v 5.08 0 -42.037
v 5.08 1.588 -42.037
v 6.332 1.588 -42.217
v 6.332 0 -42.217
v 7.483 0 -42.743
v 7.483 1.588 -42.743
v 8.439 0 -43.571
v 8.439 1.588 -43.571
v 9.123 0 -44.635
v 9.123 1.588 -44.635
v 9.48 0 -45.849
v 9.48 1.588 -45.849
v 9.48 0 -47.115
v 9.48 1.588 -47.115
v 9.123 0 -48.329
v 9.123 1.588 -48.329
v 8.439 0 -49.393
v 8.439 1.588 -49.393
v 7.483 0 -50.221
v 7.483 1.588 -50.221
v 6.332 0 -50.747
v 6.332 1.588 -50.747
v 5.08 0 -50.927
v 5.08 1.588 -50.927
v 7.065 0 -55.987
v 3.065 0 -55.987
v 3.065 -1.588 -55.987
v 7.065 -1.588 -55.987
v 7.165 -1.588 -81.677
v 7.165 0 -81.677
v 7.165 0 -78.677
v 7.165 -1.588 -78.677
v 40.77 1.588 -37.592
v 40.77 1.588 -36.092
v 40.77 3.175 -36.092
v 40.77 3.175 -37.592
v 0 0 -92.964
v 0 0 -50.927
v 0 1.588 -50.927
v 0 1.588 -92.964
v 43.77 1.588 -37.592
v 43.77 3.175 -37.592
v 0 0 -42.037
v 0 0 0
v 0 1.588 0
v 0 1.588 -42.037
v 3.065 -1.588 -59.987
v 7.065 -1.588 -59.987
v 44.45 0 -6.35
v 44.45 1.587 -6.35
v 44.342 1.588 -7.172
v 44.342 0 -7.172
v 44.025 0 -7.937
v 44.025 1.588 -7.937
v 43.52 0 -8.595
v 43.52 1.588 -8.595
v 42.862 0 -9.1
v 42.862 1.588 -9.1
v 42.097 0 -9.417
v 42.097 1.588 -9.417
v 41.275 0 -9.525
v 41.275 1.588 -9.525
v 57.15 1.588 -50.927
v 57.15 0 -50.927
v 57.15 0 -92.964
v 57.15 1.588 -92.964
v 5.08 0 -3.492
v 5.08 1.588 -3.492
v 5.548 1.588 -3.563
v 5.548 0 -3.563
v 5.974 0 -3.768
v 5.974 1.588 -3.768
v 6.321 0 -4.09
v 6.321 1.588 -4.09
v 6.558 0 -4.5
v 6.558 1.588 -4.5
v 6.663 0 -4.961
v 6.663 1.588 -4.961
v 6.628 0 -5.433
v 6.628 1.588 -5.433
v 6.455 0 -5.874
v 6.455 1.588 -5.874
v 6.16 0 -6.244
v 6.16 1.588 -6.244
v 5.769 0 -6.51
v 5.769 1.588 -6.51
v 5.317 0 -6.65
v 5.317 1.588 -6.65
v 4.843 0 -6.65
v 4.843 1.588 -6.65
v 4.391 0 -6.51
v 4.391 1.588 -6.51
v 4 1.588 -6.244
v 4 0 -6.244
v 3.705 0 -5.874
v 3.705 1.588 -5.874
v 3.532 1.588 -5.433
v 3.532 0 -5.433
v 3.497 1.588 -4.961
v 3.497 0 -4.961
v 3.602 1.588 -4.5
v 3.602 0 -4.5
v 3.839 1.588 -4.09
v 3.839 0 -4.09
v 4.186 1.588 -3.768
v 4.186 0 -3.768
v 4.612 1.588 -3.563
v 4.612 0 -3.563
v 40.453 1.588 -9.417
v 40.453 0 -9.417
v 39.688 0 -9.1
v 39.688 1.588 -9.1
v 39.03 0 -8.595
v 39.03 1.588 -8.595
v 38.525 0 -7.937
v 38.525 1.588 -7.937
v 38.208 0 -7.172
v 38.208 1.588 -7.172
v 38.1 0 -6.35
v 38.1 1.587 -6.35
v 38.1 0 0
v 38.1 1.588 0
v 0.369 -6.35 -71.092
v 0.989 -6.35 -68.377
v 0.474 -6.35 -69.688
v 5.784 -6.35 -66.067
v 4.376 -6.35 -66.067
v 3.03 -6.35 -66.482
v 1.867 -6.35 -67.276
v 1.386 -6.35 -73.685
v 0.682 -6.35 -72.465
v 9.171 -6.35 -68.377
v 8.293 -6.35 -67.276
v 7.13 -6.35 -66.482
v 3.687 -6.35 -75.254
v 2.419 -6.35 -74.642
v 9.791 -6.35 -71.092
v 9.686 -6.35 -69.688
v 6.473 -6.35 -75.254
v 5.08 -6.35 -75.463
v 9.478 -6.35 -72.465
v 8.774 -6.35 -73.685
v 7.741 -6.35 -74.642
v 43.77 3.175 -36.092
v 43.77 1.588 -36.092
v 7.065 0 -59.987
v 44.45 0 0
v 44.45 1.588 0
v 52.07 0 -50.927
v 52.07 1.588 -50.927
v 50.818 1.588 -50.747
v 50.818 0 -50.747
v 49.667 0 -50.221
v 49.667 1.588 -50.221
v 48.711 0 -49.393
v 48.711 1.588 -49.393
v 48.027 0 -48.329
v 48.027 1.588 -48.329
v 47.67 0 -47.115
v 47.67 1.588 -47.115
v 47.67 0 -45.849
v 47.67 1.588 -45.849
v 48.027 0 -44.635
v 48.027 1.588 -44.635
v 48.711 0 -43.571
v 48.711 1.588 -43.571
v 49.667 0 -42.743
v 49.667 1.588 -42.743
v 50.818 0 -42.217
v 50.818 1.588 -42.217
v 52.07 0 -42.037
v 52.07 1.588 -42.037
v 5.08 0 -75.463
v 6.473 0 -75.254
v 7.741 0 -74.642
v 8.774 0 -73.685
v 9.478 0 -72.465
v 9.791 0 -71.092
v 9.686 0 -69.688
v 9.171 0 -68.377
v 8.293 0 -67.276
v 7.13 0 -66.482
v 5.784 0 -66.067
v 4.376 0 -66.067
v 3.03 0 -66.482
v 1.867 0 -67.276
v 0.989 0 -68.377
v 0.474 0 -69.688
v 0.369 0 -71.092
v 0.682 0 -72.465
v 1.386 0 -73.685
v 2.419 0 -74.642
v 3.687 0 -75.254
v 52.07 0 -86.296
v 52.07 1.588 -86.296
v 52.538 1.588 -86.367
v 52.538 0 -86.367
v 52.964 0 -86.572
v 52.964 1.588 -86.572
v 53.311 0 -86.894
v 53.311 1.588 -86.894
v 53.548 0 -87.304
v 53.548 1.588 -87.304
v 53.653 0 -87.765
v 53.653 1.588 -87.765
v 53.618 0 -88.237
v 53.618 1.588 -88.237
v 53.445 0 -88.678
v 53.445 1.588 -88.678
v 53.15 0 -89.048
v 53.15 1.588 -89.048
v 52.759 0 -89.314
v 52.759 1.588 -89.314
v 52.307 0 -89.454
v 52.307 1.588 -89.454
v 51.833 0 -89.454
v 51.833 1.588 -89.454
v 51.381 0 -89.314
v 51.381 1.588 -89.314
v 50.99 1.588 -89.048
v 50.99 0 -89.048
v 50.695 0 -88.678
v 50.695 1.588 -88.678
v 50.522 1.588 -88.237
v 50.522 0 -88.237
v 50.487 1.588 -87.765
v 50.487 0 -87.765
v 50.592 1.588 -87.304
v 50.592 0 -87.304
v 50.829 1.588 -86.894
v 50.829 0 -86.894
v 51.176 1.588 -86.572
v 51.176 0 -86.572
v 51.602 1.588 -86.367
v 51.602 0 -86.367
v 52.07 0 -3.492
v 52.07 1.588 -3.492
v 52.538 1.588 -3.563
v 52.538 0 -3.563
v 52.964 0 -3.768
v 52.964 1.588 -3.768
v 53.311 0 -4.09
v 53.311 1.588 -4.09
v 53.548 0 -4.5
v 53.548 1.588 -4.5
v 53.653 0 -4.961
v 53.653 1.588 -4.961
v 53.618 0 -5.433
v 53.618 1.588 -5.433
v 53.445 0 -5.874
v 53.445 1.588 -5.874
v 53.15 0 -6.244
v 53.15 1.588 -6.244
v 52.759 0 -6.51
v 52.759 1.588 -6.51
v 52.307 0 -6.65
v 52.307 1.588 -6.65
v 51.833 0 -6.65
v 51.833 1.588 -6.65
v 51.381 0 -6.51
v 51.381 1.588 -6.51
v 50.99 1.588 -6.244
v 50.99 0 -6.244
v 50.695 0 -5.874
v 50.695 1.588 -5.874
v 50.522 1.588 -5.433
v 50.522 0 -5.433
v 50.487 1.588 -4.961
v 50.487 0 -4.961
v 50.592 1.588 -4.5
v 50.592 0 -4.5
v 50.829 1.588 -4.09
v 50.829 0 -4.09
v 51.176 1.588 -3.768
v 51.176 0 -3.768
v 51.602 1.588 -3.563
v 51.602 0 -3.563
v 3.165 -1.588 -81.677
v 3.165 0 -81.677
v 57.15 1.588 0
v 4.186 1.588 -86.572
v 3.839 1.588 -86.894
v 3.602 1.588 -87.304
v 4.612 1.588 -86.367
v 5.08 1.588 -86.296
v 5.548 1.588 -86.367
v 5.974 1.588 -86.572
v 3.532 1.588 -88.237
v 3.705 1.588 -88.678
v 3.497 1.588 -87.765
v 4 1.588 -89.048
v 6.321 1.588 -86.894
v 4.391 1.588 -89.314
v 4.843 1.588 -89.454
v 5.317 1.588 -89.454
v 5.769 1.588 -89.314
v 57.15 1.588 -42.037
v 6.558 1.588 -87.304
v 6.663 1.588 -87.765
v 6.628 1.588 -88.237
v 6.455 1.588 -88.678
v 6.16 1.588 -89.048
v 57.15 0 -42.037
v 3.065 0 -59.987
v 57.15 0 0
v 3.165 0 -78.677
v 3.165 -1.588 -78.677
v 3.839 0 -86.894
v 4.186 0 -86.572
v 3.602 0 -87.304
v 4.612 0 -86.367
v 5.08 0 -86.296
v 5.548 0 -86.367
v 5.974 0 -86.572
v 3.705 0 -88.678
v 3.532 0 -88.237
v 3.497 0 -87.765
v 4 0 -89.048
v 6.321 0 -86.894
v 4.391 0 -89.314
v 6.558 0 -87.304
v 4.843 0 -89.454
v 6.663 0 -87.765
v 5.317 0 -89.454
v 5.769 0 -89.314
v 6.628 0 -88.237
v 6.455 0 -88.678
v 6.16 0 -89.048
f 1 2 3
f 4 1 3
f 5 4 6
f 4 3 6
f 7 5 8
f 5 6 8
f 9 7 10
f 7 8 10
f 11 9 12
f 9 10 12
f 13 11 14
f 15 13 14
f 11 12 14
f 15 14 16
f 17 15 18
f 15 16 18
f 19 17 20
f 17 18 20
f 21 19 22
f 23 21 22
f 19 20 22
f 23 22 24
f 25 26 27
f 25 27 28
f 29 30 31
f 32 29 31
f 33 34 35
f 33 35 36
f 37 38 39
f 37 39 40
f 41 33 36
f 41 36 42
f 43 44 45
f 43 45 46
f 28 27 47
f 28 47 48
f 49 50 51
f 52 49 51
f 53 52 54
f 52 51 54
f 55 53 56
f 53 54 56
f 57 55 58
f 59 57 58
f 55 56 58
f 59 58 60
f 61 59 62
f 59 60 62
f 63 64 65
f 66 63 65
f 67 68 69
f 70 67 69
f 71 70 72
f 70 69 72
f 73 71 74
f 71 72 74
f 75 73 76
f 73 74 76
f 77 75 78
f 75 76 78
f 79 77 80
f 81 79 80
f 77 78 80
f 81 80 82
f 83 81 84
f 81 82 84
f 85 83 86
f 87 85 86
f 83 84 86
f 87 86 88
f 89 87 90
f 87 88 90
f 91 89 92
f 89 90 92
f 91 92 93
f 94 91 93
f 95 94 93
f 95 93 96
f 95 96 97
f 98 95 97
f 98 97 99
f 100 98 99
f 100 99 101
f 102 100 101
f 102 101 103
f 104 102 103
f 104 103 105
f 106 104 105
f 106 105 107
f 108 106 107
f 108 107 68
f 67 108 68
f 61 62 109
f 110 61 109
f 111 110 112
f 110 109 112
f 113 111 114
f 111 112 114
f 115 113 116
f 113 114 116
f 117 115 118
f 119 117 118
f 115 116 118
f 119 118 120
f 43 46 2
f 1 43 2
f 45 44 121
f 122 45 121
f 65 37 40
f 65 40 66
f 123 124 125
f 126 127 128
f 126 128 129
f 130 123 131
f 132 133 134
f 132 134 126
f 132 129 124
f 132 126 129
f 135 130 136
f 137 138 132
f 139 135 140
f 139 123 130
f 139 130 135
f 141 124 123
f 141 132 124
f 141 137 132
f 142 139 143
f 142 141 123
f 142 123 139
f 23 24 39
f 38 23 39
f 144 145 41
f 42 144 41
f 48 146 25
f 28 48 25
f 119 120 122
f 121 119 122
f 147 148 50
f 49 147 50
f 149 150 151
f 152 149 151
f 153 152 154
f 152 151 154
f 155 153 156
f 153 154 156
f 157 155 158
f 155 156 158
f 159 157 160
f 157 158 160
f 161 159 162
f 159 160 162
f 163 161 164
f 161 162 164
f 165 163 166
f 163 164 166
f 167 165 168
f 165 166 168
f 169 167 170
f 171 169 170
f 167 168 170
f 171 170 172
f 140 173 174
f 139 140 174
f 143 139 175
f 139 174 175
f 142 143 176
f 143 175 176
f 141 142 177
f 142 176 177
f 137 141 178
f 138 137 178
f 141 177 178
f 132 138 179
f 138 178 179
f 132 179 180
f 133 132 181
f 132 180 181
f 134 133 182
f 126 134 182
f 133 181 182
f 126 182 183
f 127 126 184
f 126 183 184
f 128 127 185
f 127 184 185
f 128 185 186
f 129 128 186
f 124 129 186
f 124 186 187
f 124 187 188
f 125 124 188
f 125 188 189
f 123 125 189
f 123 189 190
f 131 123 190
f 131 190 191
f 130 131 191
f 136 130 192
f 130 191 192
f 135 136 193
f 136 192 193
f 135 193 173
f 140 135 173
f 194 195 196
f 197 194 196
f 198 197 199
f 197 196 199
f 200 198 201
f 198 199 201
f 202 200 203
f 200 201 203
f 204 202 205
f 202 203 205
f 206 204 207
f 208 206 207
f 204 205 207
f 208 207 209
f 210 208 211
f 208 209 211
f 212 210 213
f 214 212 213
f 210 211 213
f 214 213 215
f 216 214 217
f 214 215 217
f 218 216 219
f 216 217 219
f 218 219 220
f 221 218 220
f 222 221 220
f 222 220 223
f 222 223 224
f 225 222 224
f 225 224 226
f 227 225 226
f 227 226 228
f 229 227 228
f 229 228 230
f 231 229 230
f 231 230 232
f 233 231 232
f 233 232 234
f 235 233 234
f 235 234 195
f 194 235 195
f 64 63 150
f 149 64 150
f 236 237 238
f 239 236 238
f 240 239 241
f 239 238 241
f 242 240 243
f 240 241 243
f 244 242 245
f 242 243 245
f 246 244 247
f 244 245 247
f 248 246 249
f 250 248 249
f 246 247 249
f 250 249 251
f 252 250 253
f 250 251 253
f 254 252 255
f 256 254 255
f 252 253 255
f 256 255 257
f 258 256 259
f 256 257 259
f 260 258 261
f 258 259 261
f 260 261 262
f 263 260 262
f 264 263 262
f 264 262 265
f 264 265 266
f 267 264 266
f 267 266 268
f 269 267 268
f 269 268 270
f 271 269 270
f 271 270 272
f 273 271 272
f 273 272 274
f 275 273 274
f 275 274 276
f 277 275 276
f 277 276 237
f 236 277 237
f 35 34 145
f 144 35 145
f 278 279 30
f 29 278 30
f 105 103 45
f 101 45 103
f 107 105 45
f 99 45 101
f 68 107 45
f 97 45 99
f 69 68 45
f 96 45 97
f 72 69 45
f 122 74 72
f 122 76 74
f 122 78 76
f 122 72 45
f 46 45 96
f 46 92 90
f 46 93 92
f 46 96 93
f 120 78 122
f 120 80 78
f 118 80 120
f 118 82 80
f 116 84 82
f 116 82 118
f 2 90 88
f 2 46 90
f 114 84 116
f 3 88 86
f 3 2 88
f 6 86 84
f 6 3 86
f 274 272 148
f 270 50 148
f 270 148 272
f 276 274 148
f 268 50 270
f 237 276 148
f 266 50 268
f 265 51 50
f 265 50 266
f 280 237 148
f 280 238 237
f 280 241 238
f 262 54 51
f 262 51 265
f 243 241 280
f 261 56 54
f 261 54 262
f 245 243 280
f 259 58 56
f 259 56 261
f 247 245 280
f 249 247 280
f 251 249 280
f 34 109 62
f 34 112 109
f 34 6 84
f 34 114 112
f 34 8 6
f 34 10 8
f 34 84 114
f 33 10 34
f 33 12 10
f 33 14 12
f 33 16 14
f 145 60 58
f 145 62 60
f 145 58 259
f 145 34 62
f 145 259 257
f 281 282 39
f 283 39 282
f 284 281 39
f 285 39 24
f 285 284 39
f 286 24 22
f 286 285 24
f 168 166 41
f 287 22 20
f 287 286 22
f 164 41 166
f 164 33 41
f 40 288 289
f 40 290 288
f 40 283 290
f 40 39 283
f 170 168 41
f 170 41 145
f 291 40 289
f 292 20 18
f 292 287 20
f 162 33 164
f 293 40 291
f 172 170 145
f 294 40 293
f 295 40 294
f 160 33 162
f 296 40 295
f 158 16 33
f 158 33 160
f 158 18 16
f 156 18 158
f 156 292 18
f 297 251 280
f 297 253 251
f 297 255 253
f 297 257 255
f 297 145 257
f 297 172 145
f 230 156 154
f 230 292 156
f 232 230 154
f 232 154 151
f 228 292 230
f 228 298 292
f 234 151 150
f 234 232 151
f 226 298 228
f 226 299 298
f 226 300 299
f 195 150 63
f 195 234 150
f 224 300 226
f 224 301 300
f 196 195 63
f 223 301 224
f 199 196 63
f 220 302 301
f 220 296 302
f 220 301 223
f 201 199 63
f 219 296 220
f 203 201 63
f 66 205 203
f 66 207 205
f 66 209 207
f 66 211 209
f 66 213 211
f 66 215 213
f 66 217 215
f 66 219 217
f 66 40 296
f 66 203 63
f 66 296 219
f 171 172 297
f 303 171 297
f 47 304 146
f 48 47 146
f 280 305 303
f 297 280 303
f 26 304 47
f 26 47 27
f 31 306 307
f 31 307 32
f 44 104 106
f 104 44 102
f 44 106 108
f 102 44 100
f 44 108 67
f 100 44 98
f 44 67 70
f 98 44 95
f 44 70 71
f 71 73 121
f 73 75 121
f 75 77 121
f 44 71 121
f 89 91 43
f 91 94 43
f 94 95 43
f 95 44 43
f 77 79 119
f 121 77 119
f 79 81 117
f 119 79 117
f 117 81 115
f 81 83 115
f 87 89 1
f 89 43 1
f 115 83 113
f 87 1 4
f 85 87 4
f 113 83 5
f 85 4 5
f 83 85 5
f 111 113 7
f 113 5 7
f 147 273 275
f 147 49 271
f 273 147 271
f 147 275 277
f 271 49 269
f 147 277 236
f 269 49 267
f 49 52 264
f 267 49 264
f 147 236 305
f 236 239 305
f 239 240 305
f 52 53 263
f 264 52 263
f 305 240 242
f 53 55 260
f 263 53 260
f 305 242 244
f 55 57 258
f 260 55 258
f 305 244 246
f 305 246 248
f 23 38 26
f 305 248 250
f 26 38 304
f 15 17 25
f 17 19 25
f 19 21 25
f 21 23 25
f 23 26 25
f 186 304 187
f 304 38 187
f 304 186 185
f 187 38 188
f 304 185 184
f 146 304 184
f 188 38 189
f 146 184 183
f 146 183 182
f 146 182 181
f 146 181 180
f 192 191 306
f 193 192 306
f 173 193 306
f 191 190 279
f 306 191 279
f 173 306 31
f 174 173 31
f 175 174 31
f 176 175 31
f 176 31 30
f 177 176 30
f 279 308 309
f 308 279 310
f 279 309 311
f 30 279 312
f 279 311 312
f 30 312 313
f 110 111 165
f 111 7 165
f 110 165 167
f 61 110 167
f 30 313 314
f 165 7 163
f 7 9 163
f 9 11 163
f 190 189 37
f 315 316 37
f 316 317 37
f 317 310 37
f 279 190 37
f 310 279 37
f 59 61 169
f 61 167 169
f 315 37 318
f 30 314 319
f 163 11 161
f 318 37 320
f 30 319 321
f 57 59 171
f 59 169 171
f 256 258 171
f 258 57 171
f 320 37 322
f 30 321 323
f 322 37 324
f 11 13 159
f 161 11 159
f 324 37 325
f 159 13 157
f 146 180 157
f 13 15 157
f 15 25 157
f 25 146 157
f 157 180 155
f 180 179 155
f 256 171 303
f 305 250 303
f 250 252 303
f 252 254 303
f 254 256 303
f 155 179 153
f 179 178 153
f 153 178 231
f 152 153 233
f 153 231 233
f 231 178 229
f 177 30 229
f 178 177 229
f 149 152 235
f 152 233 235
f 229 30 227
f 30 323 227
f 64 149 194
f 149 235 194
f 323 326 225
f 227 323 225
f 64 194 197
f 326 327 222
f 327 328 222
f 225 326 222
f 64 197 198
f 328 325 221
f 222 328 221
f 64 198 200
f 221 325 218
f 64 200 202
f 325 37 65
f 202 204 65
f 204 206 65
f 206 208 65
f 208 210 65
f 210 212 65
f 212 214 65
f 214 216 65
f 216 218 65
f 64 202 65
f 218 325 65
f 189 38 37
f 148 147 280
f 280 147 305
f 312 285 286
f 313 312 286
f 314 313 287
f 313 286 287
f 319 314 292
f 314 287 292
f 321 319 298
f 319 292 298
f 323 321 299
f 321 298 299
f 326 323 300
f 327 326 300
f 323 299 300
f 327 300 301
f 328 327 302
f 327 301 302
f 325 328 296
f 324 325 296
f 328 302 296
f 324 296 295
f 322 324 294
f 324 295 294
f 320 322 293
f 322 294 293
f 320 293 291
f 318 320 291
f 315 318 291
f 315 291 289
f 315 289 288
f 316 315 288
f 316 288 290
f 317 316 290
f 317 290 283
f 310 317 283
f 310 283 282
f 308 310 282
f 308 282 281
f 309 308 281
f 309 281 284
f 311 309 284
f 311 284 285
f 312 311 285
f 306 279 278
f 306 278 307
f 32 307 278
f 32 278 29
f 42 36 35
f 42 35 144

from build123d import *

# Parameters (mm, degrees)
SKETCH1_W           = 57.15
SKETCH1_H           = 92.964
BOSS_EXTRUDE1_DEPTH = 1.5875
SKETCH2_R           = 1.5875
CUT_EXTRUDE1_DEPTH  = 110.137289467
SKETCH3_R           = 4.445
CUT_EXTRUDE2_DEPTH  = 110.137289467
CUT_EXTRUDE3_REACH  = 111.137
SKETCH5_R           = 4.7244
BOSS_EXTRUDE2_DEPTH = 6.35
SKETCH5_3_W         = 4
SKETCH5_3_H         = 4
SKETCH5_3_H_2       = 3
BOSS_EXTRUDE3_DEPTH = 1.5875
SKETCH7_W           = 3
SKETCH7_H           = 1.5
BOSS_EXTRUDE4_DEPTH = 1.5875


with BuildPart() as part:
    # Sketch1 → Boss-Extrude1 (new body)
    with BuildSketch(Plane(origin=(0, 0, 0), x_dir=(1, 0, 0), z_dir=(0, 1, 0))):
        with Locations((28.575, 46.482)):
            Rectangle(SKETCH1_W, SKETCH1_H)
    extrude(amount=BOSS_EXTRUDE1_DEPTH)

    # Sketch2 → Cut-Extrude1 (cut, through all)
    with BuildSketch(Plane(origin=(0, 1.5875, 0), x_dir=(1, 0, 0), z_dir=(0, 1, 0))):
        with Locations(Location((5.08, 87.884, 0), (0, 0, 270))):
            Circle(SKETCH2_R)
        with Locations(Location((52.07, 87.884, 0), (0, 0, 270))):
            Circle(SKETCH2_R)
        with Locations(Location((5.08, 5.08, 0), (0, 0, 270))):
            Circle(SKETCH2_R)
        with Locations(Location((52.07, 5.08, 0), (0, 0, 270))):
            Circle(SKETCH2_R)
    extrude(amount=-CUT_EXTRUDE1_DEPTH, mode=Mode.SUBTRACT)

    # Sketch3 → Cut-Extrude2 (cut, through all)
    with BuildSketch(Plane(origin=(0, 1.5875, 0), x_dir=(1, 0, 0), z_dir=(0, 1, 0))):
        with BuildLine():
            ThreePointArc((56.515, 46.482), (55.213089642, 43.338910358), (52.07, 42.037))
            Line((52.07, 42.037), (57.15, 42.037))
            Line((57.15, 42.037), (57.15, 50.927))
            Line((57.15, 50.927), (52.07, 50.927))
            ThreePointArc((52.07, 50.927), (55.213089642, 49.625089642), (56.515, 46.482))
        make_face()
        with Locations((52.07, 46.482)):
            Circle(SKETCH3_R)
        with Locations((5.08, 46.482)):
            Circle(SKETCH3_R)
        with BuildLine():
            Line((5.08, 50.927), (0, 50.927))
            Line((0, 50.927), (0, 42.037))
            Line((0, 42.037), (5.08, 42.037))
            ThreePointArc((5.08, 42.037), (0.635, 46.482), (5.08, 50.927))
        make_face()
    extrude(amount=-CUT_EXTRUDE2_DEPTH, mode=Mode.SUBTRACT)

    # Sketch4 → Cut-Extrude3 (cut, up to next)
    with BuildSketch(Plane(origin=(0, 1.5875, 0), x_dir=(1, 0, 0), z_dir=(0, 1, 0)), mode=Mode.PRIVATE) as cut_extrude3_sk1:
        with BuildLine():
            ThreePointArc((41.275, 3.175), (43.52006403, 4.10493597), (44.45, 6.35))
            ThreePointArc((44.45, 6.35), (43.52006403, 8.59506403), (41.275, 9.525))
            Line((41.275, 9.525), (41.275, 3.175))
        make_face()
    cut_extrude3_tool1 = extrude(cut_extrude3_sk1.sketch, amount=-CUT_EXTRUDE3_REACH, mode=Mode.PRIVATE) & part.part
    # Sketch4 → Cut-Extrude3 (cut, up to next)
    with BuildSketch(Plane(origin=(0, 1.5875, 0), x_dir=(1, 0, 0), z_dir=(0, 1, 0)), mode=Mode.PRIVATE) as cut_extrude3_sk2:
        with BuildLine():
            Line((41.275, 3.175), (41.275, 9.525))
            ThreePointArc((41.275, 9.525), (39.02993597, 8.59506403), (38.1, 6.35))
            ThreePointArc((38.1, 6.35), (39.02993597, 4.10493597), (41.275, 3.175))
        make_face()
    cut_extrude3_tool2 = extrude(cut_extrude3_sk2.sketch, amount=-CUT_EXTRUDE3_REACH, mode=Mode.PRIVATE) & part.part
    # Sketch4 → Cut-Extrude3 (cut, up to next)
    with BuildSketch(Plane(origin=(0, 1.5875, 0), x_dir=(1, 0, 0), z_dir=(0, 1, 0)), mode=Mode.PRIVATE) as cut_extrude3_sk3:
        with BuildLine():
            ThreePointArc((41.275, 3.175), (43.52006403, 4.10493597), (44.45, 6.35))
            ThreePointArc((44.45, 6.35), (43.52006403, 8.59506403), (41.275, 9.525))
            Line((41.275, 9.525), (41.275, 3.175))
        make_face()
    cut_extrude3_tool3 = extrude(cut_extrude3_sk3.sketch, amount=-CUT_EXTRUDE3_REACH, mode=Mode.PRIVATE) & part.part
    # Sketch4 → Cut-Extrude3 (cut, up to next)
    with BuildSketch(Plane(origin=(0, 1.5875, 0), x_dir=(1, 0, 0), z_dir=(0, 1, 0)), mode=Mode.PRIVATE) as cut_extrude3_sk4:
        with BuildLine():
            Line((41.275, 3.175), (41.275, 9.525))
            ThreePointArc((41.275, 9.525), (39.02993597, 8.59506403), (38.1, 6.35))
            ThreePointArc((38.1, 6.35), (39.02993597, 4.10493597), (41.275, 3.175))
        make_face()
    cut_extrude3_tool4 = extrude(cut_extrude3_sk4.sketch, amount=-CUT_EXTRUDE3_REACH, mode=Mode.PRIVATE) & part.part
    # Sketch4 → Cut-Extrude3 (cut, up to next)
    with BuildSketch(Plane(origin=(0, 1.5875, 0), x_dir=(1, 0, 0), z_dir=(0, 1, 0)), mode=Mode.PRIVATE) as cut_extrude3_sk5:
        with BuildLine():
            Line((41.275, 0), (41.275, 3.175))
            ThreePointArc((41.275, 3.175), (39.02993597, 4.10493597), (38.1, 6.35))
            Line((38.1, 6.35), (38.1, 0))
            Line((38.1, 0), (41.275, 0))
        make_face()
    cut_extrude3_tool5 = extrude(cut_extrude3_sk5.sketch, amount=-CUT_EXTRUDE3_REACH, mode=Mode.PRIVATE) & part.part
    # Sketch4 → Cut-Extrude3 (cut, up to next)
    with BuildSketch(Plane(origin=(0, 1.5875, 0), x_dir=(1, 0, 0), z_dir=(0, 1, 0)), mode=Mode.PRIVATE) as cut_extrude3_sk6:
        with BuildLine():
            Line((44.45, 0), (44.45, 6.35))
            ThreePointArc((44.45, 6.35), (43.52006403, 4.10493597), (41.275, 3.175))
            Line((41.275, 3.175), (41.275, 0))
            Line((41.275, 0), (44.45, 0))
        make_face()
    cut_extrude3_tool6 = extrude(cut_extrude3_sk6.sketch, amount=-CUT_EXTRUDE3_REACH, mode=Mode.PRIVATE) & part.part
    add(cut_extrude3_tool1.solids().sort_by_distance((42.622512, 1.5875, -6.35))[0], mode=Mode.SUBTRACT)
    add(cut_extrude3_tool2.solids().sort_by_distance((39.927488, 1.5875, -6.35))[0], mode=Mode.SUBTRACT)
    add(cut_extrude3_tool3.solids().sort_by_distance((42.622512, 1.5875, -6.35))[0], mode=Mode.SUBTRACT)
    add(cut_extrude3_tool4.solids().sort_by_distance((39.927488, 1.5875, -6.35))[0], mode=Mode.SUBTRACT)
    add(cut_extrude3_tool5.solids().sort_by_distance((39.532316, 1.5875, -1.993291))[0], mode=Mode.SUBTRACT)
    add(cut_extrude3_tool6.solids().sort_by_distance((43.017684, 1.5875, -1.993291))[0], mode=Mode.SUBTRACT)

    # Sketch5 → Boss-Extrude2 (add)
    with BuildSketch(Plane.XZ):
        with Locations(Location((5.08, -70.739, 0), (0, 0, 270))):
            Circle(SKETCH5_R)
    extrude(amount=BOSS_EXTRUDE2_DEPTH)

    # Sketch5<3> → Boss-Extrude3 (add)
    with BuildSketch(Plane.XZ):
        with Locations((5.064710223, -57.987286883)):
            Rectangle(SKETCH5_3_W, SKETCH5_3_H)
        with Locations((5.164801178, -80.177059989)):
            Rectangle(SKETCH5_3_W, SKETCH5_3_H_2)
    extrude(amount=BOSS_EXTRUDE3_DEPTH)

    # Sketch7 → Boss-Extrude4 (add)
    with BuildSketch(Plane(origin=(0, 1.5875, 0), x_dir=(1, 0, 0), z_dir=(0, 1, 0))):
        with Locations((42.270458801, 36.842)):
            Rectangle(SKETCH7_W, SKETCH7_H)
    extrude(amount=BOSS_EXTRUDE4_DEPTH)


solid = part.part
